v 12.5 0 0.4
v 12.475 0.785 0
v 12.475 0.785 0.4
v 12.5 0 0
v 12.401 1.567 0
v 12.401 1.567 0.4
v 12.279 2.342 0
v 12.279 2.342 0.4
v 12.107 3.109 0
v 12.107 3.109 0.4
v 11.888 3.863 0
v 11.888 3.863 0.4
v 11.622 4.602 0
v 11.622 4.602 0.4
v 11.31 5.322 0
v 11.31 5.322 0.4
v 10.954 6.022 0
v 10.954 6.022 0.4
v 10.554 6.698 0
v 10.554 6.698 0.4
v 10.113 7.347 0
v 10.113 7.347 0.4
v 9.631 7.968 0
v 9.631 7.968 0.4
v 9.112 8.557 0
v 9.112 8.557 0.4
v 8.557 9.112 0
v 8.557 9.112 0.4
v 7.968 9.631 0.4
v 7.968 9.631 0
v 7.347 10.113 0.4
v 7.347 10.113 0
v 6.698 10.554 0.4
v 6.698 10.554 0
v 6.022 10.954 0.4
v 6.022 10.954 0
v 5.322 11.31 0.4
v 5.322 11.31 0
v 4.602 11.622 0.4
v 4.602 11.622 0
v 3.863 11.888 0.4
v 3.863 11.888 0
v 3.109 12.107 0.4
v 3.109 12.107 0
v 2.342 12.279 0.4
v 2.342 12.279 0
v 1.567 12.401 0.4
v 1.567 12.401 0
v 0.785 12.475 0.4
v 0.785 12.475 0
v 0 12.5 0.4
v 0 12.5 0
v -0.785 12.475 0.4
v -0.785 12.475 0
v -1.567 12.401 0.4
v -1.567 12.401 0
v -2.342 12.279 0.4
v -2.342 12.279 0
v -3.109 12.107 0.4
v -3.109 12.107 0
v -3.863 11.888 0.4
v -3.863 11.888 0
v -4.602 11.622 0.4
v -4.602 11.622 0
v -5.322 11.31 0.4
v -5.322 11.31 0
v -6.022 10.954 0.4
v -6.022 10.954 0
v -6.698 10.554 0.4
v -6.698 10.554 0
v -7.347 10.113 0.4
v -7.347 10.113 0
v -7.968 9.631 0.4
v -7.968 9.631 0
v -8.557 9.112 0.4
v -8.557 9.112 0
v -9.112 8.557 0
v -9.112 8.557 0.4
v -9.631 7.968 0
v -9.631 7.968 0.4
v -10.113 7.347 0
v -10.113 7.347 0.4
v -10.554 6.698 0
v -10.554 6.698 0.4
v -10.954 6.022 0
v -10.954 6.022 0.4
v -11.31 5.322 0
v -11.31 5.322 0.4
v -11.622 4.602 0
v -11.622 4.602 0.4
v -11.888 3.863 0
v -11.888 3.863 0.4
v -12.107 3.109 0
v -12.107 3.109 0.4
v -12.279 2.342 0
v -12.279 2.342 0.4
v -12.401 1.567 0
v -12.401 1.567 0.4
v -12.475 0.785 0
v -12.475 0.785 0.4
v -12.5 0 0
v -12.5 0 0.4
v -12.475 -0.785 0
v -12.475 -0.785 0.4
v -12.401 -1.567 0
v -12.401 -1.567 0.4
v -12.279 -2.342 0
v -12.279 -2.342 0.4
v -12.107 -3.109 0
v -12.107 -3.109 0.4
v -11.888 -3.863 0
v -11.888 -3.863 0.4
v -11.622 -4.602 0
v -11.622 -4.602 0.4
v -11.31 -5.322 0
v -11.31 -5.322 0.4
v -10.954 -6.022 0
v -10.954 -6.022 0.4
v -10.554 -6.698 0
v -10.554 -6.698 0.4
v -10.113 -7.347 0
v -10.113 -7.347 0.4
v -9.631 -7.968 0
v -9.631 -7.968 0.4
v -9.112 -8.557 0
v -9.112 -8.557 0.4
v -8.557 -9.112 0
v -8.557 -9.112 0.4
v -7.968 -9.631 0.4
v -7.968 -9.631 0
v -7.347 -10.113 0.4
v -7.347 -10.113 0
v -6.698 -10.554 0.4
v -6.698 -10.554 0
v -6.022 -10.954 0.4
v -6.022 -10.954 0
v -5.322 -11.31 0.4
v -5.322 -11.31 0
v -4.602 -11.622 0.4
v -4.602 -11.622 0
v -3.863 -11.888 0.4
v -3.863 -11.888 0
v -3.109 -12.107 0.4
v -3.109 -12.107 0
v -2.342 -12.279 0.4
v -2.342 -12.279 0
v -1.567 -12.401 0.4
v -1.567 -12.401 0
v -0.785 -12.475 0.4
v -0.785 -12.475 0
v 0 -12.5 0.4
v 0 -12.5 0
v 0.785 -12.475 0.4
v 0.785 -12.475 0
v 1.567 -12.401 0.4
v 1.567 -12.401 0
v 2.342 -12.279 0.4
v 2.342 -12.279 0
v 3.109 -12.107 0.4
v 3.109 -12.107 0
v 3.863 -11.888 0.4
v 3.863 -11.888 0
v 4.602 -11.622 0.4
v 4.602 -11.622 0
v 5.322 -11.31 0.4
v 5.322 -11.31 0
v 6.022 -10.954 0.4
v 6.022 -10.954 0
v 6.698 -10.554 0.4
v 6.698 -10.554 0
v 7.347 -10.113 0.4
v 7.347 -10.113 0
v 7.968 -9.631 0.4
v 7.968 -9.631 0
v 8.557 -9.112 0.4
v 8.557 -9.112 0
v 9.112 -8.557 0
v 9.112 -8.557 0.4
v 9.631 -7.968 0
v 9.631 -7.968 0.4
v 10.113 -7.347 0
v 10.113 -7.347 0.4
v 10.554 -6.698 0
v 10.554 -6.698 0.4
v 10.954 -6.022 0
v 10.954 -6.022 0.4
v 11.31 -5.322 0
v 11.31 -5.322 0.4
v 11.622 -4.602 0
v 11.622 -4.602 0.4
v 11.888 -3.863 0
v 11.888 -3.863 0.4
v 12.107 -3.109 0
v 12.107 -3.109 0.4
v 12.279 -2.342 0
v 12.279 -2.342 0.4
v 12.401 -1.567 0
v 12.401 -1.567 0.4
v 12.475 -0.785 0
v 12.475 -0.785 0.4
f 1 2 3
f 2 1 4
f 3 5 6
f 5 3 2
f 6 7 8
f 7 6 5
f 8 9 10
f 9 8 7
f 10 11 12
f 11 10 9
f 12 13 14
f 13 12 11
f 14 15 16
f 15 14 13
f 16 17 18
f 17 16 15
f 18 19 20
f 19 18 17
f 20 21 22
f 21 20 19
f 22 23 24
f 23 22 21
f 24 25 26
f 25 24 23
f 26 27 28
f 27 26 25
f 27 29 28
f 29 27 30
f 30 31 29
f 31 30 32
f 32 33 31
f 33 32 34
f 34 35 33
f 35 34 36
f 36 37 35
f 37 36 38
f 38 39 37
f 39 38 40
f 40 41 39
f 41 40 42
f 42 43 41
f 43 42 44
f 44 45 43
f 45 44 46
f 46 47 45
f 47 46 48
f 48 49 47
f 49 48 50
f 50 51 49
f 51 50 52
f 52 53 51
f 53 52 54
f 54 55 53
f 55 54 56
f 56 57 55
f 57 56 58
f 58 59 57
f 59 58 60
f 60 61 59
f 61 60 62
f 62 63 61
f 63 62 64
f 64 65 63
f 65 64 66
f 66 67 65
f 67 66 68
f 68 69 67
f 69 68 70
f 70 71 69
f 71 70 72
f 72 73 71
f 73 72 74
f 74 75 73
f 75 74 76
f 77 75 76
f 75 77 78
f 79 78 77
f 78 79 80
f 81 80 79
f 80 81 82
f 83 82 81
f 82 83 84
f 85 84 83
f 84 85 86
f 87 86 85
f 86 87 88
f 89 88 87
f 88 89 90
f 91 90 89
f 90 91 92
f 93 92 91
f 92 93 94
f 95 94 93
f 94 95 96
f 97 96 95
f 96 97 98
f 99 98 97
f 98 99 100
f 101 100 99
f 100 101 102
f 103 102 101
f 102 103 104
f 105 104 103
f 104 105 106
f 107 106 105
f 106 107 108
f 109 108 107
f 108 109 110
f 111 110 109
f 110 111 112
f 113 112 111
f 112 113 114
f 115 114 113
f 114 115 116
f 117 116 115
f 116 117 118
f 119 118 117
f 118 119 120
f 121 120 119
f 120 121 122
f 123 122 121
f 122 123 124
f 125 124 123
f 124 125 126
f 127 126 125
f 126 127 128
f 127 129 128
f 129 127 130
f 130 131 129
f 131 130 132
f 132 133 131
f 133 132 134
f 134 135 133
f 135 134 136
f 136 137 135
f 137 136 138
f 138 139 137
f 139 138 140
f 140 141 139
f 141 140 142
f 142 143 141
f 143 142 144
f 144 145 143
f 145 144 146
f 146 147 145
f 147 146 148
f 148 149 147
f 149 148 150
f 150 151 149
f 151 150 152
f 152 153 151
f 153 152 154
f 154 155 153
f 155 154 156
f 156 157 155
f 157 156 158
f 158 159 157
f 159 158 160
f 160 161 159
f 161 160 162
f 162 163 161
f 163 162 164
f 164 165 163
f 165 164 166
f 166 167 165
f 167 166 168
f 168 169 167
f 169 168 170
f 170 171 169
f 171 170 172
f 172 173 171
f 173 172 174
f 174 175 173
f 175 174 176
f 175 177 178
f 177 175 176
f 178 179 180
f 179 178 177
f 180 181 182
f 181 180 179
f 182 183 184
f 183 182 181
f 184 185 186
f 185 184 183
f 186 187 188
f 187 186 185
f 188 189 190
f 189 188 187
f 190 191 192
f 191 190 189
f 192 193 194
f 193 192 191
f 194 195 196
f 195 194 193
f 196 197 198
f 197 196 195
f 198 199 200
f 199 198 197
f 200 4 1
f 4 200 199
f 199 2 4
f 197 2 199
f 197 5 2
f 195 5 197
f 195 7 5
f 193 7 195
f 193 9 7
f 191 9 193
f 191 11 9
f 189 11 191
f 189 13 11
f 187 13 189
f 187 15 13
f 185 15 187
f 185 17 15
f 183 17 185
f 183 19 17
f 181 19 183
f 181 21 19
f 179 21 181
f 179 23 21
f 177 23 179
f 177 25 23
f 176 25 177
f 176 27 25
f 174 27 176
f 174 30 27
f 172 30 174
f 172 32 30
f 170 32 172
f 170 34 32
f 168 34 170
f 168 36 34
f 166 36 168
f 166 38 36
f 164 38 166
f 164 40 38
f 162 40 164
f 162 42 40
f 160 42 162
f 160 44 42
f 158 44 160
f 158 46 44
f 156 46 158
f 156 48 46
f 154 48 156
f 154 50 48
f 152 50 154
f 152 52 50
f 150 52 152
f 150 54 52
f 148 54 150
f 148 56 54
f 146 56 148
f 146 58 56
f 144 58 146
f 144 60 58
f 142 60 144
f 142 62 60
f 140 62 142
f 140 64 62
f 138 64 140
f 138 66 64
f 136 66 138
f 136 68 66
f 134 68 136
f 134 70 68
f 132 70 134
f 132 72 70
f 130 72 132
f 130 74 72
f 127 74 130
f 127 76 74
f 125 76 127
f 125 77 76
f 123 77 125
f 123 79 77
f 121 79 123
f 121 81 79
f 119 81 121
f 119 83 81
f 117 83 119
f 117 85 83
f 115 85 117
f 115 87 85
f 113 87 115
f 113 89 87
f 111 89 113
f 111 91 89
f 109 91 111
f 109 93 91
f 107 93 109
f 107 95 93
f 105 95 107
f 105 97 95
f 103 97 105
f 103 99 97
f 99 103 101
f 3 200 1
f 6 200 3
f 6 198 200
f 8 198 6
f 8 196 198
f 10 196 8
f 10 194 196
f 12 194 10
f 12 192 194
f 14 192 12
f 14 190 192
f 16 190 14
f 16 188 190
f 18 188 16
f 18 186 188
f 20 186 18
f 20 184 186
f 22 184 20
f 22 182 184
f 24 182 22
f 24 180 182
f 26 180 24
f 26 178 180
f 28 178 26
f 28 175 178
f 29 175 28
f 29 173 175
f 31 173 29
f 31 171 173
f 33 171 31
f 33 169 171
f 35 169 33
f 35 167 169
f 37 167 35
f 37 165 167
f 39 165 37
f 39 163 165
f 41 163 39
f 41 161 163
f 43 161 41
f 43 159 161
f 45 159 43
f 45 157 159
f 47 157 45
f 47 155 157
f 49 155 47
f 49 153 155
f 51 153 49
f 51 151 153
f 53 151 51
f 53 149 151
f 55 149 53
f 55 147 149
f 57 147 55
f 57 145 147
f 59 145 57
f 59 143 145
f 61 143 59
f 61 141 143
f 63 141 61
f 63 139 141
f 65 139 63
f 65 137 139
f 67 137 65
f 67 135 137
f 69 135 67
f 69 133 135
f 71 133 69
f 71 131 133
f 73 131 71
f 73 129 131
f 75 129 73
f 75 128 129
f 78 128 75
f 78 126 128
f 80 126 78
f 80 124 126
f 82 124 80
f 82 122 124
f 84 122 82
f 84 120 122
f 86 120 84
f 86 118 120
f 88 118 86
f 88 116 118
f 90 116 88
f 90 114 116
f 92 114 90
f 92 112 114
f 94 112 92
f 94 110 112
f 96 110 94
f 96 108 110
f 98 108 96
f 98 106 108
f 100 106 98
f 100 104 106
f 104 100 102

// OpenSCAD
edge = 25;

cylinder(
    r = edge/2,
    h = 0.4,
    center = false,
    $fn = 100);
